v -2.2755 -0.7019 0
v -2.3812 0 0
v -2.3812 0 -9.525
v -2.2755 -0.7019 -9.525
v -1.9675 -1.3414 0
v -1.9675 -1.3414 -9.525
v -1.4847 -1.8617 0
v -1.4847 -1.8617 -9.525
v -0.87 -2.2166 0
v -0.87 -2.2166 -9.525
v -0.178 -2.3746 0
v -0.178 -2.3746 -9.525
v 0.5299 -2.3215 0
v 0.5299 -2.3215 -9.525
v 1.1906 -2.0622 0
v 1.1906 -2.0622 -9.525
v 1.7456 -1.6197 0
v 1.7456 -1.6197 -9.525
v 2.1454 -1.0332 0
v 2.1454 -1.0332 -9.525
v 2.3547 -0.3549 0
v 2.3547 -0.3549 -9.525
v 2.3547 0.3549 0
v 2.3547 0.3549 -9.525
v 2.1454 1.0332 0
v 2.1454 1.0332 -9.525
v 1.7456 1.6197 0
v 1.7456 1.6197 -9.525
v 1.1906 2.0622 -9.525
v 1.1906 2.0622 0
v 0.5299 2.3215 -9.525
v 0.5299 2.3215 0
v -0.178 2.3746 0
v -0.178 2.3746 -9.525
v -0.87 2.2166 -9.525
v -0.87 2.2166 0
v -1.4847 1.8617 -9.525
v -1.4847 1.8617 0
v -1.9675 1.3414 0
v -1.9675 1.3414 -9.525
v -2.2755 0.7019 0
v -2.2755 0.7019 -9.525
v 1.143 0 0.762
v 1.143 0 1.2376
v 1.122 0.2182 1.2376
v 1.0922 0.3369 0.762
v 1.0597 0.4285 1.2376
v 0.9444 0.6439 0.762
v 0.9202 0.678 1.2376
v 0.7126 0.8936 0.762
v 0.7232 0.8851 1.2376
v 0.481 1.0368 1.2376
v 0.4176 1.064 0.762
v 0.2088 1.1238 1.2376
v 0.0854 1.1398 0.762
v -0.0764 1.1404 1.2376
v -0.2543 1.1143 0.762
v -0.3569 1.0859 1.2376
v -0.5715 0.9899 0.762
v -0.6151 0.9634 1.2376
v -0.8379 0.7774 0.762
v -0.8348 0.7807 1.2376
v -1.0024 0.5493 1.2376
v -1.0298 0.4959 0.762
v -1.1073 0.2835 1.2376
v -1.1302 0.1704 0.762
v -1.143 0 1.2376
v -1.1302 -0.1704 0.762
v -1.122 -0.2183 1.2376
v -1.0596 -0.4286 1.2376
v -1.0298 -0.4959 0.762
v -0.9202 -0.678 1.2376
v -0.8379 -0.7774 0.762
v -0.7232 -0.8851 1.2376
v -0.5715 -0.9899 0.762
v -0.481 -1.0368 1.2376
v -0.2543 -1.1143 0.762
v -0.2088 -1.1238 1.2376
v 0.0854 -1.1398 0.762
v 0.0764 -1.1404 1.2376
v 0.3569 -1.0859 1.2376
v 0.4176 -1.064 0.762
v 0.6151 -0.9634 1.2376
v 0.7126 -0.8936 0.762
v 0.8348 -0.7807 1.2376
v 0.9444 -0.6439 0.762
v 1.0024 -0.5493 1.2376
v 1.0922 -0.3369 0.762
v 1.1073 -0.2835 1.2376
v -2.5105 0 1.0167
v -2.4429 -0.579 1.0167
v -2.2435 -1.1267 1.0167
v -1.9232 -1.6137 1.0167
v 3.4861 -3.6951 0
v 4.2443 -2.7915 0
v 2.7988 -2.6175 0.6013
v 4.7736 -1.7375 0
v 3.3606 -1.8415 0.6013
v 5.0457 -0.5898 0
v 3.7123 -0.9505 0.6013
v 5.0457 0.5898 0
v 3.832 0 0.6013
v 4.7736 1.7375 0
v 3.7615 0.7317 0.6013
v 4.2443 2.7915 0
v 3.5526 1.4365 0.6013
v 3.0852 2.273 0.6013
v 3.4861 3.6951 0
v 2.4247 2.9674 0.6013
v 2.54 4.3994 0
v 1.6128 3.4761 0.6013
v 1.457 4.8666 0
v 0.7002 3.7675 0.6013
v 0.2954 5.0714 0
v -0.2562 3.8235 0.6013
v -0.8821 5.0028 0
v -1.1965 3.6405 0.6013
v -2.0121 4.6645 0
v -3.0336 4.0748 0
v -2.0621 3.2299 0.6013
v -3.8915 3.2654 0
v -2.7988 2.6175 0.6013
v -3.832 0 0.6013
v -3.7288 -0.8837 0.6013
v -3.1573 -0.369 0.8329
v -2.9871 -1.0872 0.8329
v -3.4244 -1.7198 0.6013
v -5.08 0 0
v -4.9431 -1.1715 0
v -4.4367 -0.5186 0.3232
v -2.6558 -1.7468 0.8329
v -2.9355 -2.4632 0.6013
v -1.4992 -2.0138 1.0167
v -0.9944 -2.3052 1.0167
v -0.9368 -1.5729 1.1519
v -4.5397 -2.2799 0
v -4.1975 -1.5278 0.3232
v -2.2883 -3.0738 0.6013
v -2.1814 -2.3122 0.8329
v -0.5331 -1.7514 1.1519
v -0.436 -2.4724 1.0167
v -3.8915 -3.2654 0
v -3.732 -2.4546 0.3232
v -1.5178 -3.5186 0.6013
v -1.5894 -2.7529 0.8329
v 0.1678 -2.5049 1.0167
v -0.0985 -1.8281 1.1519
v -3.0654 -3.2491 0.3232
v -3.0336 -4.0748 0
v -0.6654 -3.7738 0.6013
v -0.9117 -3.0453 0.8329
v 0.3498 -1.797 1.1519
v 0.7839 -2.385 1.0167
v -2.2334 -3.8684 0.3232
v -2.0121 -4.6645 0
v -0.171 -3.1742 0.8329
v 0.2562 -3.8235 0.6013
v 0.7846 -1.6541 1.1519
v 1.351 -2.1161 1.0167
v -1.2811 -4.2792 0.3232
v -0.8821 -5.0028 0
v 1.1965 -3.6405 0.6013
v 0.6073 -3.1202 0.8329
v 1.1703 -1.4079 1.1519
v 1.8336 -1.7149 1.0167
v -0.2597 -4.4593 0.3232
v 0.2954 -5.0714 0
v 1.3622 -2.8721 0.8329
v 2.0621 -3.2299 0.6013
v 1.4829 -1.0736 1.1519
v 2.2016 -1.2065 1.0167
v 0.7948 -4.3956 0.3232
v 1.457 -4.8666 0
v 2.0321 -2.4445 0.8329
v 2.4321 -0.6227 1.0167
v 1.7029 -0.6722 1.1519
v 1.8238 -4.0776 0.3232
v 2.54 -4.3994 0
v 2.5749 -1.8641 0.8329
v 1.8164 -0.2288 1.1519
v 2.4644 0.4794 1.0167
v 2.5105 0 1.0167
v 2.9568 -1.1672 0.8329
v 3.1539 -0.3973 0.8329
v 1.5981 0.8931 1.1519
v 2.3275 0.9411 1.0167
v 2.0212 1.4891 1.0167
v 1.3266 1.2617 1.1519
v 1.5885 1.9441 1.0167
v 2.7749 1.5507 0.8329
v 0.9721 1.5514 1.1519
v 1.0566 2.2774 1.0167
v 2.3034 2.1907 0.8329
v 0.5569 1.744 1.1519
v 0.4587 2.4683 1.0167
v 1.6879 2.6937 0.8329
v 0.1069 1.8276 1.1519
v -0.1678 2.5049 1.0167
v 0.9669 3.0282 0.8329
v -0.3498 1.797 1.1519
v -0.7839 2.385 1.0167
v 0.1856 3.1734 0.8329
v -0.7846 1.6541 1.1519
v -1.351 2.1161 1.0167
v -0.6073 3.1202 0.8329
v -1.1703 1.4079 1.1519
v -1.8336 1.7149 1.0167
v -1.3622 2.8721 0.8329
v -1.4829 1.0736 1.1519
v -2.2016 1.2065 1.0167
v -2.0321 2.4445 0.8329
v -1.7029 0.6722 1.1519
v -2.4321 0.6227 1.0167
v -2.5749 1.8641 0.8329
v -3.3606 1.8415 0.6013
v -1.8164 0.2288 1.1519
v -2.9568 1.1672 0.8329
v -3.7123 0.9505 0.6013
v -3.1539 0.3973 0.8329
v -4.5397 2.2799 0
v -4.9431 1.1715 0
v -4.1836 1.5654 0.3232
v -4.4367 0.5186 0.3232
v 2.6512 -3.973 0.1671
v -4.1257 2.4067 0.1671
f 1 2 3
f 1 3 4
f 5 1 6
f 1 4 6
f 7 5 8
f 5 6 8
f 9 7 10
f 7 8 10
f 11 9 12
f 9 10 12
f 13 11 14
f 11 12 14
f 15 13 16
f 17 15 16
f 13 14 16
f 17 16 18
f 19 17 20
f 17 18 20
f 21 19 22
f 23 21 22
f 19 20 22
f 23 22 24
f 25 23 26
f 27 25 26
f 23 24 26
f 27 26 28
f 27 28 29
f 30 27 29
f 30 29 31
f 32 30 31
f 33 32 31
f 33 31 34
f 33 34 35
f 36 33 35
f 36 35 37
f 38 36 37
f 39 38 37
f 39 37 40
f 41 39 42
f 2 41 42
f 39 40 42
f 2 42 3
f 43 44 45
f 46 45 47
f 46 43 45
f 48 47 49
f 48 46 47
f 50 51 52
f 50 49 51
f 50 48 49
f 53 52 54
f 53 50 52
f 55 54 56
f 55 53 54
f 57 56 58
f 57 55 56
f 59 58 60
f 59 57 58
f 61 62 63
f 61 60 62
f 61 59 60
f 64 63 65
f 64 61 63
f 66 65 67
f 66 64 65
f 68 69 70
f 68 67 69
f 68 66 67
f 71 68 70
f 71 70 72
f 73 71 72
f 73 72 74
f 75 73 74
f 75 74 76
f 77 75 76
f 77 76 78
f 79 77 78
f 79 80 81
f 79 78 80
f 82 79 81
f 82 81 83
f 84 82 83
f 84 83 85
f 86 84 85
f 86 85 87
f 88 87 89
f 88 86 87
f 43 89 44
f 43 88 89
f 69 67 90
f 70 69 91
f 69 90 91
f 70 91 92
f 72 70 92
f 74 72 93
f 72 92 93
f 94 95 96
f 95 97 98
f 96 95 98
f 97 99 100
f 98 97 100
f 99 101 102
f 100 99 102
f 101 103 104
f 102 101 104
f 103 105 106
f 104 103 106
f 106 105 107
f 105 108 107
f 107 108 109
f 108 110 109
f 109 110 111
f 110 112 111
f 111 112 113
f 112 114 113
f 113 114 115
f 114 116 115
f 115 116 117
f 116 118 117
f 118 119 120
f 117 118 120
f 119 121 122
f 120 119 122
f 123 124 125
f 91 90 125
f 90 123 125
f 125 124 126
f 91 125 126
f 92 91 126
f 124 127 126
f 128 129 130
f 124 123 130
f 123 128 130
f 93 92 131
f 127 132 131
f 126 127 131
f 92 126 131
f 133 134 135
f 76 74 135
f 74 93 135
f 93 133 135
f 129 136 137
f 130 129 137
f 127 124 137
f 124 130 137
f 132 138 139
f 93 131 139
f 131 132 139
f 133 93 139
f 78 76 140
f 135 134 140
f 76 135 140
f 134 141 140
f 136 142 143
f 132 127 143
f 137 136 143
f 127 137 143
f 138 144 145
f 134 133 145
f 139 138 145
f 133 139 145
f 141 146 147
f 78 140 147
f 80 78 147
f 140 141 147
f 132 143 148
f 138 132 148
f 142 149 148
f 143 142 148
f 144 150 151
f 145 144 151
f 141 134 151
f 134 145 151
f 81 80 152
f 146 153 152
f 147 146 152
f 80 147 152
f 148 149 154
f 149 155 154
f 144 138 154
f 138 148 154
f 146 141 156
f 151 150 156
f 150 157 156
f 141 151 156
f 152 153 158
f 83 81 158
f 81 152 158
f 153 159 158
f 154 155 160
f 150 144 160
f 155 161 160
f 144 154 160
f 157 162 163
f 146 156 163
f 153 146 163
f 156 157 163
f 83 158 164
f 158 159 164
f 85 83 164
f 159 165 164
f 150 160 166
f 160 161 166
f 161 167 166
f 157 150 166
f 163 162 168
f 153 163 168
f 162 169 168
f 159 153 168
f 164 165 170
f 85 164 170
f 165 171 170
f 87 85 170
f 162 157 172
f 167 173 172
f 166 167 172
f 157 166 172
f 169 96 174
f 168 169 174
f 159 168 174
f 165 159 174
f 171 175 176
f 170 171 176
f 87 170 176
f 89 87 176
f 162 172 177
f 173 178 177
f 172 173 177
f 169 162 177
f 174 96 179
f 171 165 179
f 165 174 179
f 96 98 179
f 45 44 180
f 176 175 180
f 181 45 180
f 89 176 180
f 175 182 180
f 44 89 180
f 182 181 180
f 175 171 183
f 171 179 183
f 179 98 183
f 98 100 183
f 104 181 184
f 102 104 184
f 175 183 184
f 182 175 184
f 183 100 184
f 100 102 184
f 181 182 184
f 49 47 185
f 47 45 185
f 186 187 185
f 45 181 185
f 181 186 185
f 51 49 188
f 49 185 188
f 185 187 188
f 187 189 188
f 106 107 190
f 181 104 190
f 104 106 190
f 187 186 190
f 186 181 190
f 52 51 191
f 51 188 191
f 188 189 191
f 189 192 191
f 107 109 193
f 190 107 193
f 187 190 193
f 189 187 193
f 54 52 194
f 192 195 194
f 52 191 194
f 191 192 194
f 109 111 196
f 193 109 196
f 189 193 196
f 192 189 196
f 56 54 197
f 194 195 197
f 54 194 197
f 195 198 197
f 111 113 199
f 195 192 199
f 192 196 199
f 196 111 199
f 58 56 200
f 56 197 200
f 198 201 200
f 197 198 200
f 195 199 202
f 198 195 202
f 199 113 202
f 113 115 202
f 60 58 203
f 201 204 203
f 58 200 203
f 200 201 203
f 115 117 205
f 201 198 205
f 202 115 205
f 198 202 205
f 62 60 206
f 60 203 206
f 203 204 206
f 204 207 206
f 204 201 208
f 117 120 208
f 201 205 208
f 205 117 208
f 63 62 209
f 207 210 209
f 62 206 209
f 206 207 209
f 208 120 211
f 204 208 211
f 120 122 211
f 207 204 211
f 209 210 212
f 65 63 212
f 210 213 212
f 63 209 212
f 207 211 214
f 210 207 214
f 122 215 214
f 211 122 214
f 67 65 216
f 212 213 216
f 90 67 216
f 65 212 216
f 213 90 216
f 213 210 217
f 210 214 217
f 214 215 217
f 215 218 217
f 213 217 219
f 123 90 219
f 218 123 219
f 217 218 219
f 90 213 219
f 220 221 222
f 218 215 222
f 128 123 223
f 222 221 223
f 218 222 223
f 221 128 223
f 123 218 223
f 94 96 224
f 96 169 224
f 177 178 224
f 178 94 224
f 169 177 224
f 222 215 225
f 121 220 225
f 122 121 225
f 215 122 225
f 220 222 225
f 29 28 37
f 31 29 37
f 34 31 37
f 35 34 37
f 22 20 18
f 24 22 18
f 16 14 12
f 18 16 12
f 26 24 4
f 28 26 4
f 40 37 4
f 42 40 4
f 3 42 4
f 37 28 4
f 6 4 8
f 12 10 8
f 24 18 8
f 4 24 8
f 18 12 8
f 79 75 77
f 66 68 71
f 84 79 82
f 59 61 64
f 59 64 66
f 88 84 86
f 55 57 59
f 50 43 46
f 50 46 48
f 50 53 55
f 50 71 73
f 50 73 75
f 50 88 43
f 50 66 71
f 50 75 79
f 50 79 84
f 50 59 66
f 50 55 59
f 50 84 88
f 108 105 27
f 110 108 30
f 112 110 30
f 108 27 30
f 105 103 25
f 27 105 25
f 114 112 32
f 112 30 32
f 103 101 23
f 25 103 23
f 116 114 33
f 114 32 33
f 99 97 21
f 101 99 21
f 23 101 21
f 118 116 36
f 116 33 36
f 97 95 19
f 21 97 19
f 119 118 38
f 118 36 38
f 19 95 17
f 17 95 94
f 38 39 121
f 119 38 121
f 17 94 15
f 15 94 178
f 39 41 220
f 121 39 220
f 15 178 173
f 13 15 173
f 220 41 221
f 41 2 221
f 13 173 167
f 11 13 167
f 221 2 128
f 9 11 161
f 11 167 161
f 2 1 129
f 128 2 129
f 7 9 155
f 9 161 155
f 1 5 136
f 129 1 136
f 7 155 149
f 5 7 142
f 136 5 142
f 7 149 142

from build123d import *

# Parameters (mm, degrees)
F2_R      = 1.143
F3_DEPTH  = 1.275694
F3_FACE_R = 1.143
F4_DEPTH  = 0.762


with BuildPart() as f1:
    # F0 (on Front) → F1 (revolve)
    with BuildSketch(Plane.XZ):
        with BuildLine():
            ThreePointArc((0, 1.27), (-2.628273, 0.988091), (-5.08, 0))
            Line((-5.08, 0), (-2.38125, 0))
            Line((-2.38125, 0), (-2.38125, -9.525))
            Line((-2.38125, -9.525), (0, -9.525))
            Line((0, -9.525), (0, 1.27))
        make_face()
    revolve(axis=Axis((0, 0, -4.1275), (0, 0, 1)))

    # F2 (on Top) → F3 (cut, through all)
    with BuildSketch(Plane.XY):
        Circle(F2_R)
    extrude(amount=F3_DEPTH, mode=Mode.SUBTRACT)

    # F3_face (on face) → F4 (join)
    with BuildSketch(Plane.XY):
        Circle(F3_FACE_R)
    extrude(amount=F4_DEPTH)


solid = f1.part
